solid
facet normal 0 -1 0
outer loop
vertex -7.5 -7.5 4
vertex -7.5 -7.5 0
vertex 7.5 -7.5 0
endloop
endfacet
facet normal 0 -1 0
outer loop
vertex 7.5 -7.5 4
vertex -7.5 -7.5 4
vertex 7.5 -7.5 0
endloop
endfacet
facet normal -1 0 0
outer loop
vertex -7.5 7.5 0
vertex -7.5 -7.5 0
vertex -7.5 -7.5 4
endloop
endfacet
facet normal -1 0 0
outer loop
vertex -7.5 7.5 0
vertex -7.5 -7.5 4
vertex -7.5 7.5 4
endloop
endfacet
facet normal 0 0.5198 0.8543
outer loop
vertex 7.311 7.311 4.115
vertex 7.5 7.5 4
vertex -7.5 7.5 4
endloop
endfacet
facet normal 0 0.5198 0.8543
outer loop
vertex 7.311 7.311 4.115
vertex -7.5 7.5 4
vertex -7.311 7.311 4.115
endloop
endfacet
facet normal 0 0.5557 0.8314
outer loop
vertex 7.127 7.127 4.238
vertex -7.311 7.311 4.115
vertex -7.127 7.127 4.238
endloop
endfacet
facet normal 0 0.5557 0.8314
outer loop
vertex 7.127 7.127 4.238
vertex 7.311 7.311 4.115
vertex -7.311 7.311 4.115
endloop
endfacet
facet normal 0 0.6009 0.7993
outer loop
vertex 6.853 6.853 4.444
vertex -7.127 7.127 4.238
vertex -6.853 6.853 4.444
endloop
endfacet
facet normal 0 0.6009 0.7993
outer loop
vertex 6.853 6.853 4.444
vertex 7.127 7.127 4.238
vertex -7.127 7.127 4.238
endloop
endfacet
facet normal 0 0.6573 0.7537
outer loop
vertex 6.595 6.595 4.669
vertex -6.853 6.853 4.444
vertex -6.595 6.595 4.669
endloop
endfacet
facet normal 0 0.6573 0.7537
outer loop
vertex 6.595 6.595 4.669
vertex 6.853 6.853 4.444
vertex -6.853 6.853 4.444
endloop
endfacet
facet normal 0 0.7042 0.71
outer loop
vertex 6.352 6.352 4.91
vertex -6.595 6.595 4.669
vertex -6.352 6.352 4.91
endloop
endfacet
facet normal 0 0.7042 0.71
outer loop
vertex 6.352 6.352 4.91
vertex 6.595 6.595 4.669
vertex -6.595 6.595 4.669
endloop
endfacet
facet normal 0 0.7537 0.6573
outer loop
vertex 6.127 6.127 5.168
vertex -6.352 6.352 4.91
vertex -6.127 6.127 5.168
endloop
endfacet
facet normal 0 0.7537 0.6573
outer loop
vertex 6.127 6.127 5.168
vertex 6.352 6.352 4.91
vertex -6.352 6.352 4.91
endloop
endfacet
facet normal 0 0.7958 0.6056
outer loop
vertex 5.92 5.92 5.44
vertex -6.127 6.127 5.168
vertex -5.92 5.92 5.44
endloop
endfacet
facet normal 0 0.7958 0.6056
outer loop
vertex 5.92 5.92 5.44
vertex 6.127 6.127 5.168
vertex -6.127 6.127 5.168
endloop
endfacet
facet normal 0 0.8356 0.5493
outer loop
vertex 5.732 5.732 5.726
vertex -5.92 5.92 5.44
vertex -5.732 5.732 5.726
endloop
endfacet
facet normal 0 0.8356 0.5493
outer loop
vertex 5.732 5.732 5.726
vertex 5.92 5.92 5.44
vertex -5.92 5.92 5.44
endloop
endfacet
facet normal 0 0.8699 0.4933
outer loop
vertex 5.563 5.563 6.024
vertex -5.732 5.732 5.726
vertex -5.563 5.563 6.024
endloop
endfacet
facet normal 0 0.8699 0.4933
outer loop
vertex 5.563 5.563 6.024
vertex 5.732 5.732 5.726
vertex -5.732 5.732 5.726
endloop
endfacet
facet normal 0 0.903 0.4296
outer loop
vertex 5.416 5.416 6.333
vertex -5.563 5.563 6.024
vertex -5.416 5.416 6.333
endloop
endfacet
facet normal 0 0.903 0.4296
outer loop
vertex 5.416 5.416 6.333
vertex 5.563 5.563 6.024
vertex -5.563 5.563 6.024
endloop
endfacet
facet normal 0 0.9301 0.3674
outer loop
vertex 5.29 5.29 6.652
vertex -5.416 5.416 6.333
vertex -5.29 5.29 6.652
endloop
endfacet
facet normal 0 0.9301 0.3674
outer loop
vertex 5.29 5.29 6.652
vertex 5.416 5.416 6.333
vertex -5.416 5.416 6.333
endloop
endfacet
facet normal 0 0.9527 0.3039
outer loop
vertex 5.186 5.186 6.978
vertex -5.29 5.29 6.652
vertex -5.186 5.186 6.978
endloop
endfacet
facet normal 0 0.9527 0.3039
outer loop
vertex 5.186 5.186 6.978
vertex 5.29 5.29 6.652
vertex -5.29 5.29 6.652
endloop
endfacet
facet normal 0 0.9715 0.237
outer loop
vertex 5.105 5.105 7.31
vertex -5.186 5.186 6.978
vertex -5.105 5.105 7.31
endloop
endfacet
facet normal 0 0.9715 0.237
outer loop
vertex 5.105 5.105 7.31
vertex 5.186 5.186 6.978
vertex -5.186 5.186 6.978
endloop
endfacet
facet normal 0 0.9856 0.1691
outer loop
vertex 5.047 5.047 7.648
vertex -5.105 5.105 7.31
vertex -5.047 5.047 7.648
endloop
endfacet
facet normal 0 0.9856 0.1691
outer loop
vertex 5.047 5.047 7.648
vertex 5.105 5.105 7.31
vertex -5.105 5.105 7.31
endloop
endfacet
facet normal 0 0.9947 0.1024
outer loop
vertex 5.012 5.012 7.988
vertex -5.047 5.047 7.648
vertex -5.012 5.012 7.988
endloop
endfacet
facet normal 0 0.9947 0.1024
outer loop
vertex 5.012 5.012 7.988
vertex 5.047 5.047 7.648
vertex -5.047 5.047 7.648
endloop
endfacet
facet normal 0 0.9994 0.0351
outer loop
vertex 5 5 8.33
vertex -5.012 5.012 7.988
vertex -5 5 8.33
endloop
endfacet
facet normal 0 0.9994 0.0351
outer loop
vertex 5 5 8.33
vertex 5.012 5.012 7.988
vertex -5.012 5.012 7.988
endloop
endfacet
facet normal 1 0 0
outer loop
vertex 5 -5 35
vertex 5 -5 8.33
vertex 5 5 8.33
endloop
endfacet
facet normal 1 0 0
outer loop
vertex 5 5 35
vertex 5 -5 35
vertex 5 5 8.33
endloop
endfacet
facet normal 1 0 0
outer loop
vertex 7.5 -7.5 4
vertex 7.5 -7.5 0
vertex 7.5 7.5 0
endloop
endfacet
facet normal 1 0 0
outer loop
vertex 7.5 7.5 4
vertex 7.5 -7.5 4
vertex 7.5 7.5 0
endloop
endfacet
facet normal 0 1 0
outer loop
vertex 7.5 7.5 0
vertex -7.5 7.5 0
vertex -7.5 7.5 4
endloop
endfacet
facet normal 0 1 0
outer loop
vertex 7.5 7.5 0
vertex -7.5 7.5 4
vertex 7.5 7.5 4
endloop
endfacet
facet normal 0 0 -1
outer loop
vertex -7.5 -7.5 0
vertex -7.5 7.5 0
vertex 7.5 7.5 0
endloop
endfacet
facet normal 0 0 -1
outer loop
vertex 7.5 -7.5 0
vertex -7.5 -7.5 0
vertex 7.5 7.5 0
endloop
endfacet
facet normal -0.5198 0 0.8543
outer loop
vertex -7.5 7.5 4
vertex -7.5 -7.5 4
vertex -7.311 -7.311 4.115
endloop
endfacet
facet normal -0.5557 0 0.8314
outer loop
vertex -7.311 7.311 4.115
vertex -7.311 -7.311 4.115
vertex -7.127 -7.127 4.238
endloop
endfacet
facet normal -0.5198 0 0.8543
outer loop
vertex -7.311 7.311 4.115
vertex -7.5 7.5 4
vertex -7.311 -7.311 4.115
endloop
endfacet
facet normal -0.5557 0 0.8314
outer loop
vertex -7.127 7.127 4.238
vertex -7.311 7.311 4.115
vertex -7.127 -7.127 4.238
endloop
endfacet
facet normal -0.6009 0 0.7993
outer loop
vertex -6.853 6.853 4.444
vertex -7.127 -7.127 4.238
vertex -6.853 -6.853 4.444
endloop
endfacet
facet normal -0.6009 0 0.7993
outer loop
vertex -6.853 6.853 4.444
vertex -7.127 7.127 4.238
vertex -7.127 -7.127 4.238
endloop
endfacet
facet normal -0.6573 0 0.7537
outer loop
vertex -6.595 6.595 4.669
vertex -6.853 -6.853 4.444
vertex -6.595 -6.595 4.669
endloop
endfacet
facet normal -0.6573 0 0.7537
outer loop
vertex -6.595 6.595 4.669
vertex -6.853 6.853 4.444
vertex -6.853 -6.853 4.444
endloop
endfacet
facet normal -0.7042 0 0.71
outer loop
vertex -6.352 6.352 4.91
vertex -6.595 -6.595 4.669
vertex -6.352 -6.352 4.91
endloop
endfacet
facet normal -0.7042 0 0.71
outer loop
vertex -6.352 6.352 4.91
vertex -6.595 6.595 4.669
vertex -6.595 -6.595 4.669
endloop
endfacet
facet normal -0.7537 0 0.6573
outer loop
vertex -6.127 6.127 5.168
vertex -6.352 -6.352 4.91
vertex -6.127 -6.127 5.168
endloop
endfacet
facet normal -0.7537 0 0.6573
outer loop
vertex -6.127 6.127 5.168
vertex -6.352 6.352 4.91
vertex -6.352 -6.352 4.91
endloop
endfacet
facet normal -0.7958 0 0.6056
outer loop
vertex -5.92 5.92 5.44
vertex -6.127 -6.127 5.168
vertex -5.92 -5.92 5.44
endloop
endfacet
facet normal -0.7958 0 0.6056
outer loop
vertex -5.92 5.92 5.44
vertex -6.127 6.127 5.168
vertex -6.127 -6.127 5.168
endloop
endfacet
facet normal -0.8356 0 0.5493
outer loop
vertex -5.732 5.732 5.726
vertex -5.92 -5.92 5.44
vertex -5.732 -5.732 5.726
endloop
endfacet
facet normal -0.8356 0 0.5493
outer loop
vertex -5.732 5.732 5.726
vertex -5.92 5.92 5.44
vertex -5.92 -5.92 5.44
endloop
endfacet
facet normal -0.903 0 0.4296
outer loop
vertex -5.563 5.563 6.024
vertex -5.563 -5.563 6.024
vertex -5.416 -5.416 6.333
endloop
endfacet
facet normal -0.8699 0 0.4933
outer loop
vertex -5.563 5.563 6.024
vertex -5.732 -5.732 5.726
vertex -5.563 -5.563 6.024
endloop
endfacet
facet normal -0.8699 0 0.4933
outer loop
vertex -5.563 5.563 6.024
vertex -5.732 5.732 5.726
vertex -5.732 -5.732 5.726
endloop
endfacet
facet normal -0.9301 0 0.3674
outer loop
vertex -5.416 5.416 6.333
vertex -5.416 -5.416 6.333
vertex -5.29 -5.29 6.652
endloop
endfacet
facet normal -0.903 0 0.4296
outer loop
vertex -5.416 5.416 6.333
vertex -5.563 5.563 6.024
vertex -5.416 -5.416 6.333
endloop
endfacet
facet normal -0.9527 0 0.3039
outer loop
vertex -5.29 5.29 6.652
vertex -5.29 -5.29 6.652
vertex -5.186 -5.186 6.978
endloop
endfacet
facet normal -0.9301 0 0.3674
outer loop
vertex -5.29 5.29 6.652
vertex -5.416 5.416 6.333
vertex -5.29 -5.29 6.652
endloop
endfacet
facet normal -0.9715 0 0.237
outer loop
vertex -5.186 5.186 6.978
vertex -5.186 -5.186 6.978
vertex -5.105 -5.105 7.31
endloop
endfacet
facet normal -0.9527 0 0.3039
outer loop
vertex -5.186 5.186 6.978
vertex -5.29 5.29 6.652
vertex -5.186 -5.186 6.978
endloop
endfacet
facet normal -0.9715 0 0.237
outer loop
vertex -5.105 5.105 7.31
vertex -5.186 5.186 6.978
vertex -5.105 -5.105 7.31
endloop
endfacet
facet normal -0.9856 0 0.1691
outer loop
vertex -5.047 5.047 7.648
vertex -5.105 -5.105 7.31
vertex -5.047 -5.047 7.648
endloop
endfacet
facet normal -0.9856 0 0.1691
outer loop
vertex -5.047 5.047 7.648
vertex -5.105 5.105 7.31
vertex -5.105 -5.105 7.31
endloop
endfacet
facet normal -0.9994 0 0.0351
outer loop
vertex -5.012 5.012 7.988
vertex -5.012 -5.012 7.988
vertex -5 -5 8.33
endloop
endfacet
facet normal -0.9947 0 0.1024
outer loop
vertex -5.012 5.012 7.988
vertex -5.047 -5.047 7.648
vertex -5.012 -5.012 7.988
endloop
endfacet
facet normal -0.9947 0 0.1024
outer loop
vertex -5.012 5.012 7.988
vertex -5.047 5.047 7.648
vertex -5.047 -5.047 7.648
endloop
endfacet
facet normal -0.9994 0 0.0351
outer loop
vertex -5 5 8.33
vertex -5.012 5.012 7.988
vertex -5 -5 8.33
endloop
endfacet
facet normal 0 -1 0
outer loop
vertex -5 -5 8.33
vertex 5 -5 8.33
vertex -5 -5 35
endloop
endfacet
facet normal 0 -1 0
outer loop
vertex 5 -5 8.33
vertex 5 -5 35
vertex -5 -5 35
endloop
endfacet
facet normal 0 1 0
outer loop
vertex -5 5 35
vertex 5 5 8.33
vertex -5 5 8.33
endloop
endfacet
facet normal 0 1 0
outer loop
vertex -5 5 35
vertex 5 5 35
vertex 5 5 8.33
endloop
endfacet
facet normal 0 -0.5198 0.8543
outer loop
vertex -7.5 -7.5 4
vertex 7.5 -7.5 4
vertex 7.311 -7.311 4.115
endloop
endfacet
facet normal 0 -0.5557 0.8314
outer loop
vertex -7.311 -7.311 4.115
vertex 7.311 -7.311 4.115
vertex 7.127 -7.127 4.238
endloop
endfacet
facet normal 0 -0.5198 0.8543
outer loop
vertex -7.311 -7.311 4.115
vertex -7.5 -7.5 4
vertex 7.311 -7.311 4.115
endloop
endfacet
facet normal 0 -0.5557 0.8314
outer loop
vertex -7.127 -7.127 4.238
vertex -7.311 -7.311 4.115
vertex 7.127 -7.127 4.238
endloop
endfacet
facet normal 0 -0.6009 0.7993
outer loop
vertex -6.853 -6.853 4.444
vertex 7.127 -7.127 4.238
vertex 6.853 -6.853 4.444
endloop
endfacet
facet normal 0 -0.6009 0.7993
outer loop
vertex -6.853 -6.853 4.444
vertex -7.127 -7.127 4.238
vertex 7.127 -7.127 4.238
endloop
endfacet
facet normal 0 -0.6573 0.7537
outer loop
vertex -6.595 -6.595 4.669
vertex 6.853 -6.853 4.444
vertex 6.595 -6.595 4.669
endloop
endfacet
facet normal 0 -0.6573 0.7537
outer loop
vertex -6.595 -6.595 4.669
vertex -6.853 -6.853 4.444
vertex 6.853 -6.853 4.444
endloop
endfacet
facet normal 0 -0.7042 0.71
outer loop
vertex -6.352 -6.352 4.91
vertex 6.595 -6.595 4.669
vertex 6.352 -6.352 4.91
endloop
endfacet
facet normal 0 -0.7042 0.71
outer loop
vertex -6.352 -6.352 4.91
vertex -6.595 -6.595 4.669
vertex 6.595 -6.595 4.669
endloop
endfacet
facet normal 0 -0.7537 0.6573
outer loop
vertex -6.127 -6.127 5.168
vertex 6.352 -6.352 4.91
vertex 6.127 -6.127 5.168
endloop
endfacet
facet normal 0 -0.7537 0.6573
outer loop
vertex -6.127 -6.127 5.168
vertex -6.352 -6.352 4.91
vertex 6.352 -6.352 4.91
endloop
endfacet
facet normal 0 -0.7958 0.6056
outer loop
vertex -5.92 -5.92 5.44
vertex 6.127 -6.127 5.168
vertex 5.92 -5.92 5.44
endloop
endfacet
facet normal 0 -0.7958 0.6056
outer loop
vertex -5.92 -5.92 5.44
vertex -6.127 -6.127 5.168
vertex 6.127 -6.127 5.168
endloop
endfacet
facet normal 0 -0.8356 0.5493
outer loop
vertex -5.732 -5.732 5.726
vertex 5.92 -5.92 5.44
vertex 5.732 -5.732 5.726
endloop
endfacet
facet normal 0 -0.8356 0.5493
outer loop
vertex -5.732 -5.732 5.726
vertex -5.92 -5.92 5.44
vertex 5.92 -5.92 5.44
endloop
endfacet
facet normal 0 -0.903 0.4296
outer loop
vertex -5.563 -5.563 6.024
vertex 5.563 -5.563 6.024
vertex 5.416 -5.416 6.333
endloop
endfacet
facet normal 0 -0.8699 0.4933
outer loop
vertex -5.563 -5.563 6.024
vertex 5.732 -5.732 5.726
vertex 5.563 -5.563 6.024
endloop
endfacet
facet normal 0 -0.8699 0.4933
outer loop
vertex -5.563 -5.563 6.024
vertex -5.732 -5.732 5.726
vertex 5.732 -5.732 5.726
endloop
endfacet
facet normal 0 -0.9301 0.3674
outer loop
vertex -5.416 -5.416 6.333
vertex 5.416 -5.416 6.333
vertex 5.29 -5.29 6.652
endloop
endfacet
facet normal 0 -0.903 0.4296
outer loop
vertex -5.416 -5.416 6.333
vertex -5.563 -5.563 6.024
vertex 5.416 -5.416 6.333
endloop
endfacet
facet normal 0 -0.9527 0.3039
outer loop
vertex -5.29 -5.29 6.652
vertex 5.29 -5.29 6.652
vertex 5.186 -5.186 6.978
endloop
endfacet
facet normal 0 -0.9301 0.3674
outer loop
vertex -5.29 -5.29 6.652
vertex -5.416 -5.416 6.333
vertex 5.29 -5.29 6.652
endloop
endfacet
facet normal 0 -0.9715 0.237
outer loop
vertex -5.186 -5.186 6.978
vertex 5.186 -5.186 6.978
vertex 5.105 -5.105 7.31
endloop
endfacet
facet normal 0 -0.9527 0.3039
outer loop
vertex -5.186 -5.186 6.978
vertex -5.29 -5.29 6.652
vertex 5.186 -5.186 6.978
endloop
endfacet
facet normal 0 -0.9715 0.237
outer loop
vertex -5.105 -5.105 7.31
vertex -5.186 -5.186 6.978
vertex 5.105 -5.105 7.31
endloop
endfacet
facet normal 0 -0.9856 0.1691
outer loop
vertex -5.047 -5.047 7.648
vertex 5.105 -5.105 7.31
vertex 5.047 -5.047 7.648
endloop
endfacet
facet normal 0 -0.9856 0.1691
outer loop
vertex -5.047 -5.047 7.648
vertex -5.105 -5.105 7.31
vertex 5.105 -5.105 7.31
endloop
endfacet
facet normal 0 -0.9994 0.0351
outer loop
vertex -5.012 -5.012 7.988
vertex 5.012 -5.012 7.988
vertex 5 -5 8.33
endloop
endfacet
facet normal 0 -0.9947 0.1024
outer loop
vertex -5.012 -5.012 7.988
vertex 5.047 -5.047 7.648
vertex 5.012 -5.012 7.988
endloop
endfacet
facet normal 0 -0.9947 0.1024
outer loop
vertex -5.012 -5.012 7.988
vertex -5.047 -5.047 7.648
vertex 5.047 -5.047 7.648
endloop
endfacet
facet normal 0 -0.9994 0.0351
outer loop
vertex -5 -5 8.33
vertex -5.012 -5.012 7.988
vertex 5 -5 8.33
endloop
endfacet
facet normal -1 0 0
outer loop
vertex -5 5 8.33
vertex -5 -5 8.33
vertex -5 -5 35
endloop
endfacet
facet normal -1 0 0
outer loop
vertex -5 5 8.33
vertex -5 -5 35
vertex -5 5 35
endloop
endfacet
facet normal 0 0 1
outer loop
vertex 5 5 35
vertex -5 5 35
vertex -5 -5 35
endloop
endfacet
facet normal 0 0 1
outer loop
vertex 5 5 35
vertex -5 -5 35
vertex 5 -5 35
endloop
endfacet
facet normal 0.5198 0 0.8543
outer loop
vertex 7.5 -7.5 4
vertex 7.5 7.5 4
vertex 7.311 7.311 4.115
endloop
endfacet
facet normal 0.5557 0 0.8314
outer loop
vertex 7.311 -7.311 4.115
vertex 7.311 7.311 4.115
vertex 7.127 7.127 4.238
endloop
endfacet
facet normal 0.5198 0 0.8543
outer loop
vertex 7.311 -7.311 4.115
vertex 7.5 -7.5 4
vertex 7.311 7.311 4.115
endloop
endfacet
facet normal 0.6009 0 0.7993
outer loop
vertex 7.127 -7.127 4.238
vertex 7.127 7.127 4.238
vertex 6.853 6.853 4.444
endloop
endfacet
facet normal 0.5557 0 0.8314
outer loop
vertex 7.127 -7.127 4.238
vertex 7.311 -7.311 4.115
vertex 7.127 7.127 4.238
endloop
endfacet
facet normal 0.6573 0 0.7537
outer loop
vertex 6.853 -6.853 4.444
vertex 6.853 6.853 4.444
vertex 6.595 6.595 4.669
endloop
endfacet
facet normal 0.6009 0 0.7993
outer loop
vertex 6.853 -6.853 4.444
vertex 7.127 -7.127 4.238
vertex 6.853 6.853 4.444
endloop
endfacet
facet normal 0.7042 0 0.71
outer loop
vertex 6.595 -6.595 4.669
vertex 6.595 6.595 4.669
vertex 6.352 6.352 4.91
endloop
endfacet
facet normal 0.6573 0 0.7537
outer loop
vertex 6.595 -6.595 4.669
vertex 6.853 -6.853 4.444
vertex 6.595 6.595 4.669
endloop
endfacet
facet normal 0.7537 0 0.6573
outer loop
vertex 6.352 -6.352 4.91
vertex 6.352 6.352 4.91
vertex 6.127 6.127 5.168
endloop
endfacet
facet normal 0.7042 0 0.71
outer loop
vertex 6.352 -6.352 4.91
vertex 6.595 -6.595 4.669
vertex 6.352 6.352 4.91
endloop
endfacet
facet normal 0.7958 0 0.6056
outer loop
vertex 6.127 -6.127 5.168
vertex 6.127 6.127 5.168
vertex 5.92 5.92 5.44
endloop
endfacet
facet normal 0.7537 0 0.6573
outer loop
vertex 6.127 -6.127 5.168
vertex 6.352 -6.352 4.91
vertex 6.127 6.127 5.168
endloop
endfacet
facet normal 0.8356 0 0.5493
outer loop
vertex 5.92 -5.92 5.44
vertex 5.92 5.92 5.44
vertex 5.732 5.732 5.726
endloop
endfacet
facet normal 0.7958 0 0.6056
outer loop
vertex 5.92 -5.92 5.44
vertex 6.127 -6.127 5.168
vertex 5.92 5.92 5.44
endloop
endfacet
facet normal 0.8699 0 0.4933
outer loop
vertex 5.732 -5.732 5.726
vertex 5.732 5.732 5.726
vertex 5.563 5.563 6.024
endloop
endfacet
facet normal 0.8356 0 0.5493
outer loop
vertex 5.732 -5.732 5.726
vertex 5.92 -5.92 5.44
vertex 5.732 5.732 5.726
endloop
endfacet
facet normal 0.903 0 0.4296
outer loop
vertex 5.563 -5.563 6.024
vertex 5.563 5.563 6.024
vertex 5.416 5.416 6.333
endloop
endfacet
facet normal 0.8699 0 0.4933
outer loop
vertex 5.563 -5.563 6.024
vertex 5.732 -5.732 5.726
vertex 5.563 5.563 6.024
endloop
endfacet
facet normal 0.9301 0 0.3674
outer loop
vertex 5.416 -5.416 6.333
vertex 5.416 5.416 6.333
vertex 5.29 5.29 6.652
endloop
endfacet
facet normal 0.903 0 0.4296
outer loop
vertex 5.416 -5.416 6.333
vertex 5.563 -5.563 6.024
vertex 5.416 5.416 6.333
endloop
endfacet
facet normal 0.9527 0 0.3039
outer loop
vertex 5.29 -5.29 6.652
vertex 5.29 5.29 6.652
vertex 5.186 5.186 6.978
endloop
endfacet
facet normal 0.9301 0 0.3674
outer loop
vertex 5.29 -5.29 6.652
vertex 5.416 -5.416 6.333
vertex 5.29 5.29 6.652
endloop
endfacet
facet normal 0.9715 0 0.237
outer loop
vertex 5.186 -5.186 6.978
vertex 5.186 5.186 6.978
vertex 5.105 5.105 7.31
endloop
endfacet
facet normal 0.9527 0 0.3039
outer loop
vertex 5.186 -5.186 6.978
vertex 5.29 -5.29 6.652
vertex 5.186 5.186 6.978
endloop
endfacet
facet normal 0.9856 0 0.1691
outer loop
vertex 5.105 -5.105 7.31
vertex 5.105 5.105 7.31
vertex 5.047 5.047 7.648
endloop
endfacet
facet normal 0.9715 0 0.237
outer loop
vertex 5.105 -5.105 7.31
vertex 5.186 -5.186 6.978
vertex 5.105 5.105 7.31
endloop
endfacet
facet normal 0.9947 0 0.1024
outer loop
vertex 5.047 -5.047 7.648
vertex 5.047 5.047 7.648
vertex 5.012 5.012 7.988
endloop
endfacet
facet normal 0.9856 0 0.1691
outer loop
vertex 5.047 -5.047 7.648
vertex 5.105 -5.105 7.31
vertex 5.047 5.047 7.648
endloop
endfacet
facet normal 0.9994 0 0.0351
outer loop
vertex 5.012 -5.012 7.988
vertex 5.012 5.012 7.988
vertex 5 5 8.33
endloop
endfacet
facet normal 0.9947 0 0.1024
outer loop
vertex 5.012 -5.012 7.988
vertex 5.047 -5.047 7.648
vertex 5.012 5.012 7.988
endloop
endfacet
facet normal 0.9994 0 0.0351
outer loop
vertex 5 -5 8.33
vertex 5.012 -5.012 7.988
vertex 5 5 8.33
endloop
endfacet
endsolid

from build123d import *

# Parameters (mm, degrees)
F0_W         = 10
F0_H         = 10
F1_DEPTH     = 35
F2_W         = 15
F2_H         = 15
F3_DEPTH     = 4
F4_T1_DEPTH  = 10
F4_T3_DEPTH  = 10
F4_T9_DEPTH  = 20.8253175473
F4_T14_DEPTH = 20.8253175473
F4_T22_DEPTH = 20.8253175473
F4_T27_DEPTH = 20.8253175473
F4_T35_DEPTH = 20.8253175473
F4_T40_DEPTH = 20.8253175473
F4_T48_DEPTH = 20.8253175473
F4_T53_DEPTH = 20.8253175473


# Not quite as in the source:
# - a fillet or chamfer that OpenCascade refuses, or shapes differently, is made with other operations: its cross-section is extruded or revolved along the edge and cut away or added


with BuildPart() as f1:
    # F0 (on Top) → F1 (new body)
    with BuildSketch(Plane.XY):
        Rectangle(F0_W, F0_H)
    extrude(amount=F1_DEPTH)

    # F2 (on Top) → F3 (join)
    with BuildSketch(Plane.XY):
        Rectangle(F2_W, F2_H)
    extrude(amount=F3_DEPTH)

    # F4: fillet of radius 5 on 4 edges, made by hand

    # F4_s2 → F4_t1 (join)
    with BuildSketch(Plane.XZ.offset(-5)):
        with BuildLine():
            ThreePointArc((-7.5, 4), (-5.6698729811, 5.8301270189), (-5, 8.3301270189))
            Line((-5, 8.3301270189), (-5, 4))
            Line((-5, 4), (-7.5, 4))
        make_face()
        with BuildLine():
            ThreePointArc((7.5, 4), (5.6698729811, 5.8301270189), (5, 8.3301270189))
            Line((5, 8.3301270189), (5, 4))
            Line((5, 4), (7.5, 4))
        make_face()
    extrude(amount=F4_T1_DEPTH)

    # F4_s4 → F4_t3 (join)
    with BuildSketch(Plane.YZ.offset(-5)):
        with BuildLine():
            ThreePointArc((7.5, 4), (5.6698729811, 5.8301270189), (5, 8.3301270189))
            Line((5, 8.3301270189), (5, 4))
            Line((5, 4), (7.5, 4))
        make_face()
        with BuildLine():
            ThreePointArc((-7.5, 4), (-5.6698729811, 5.8301270189), (-5, 8.3301270189))
            Line((-5, 8.3301270189), (-5, 4))
            Line((-5, 4), (-7.5, 4))
        make_face()
    extrude(amount=F4_T3_DEPTH)


with BuildPart() as f4_tool7:
    # F4_s8 → F4_t9 (new body)
    with BuildSketch(Plane.YZ.offset(5)):
        with BuildLine():
            ThreePointArc((7.5, 4), (5.6698729811, 5.8301270189), (5, 8.3301270189))
            Line((5, 8.3301270189), (5, 4))
            Line((5, 4), (7.5, 4))
        make_face()
    extrude(amount=-F4_T9_DEPTH)

    split(bisect_by=Plane.YZ.offset(-7.5), keep=Keep.TOP)

    split(bisect_by=Plane.YZ.offset(-5), keep=Keep.BOTTOM)


with BuildPart() as f4_tool12:
    # F4_s13 → F4_t14 (new body)
    with BuildSketch(Plane.XZ.offset(-15.8253175473)):
        with BuildLine():
            ThreePointArc((-7.5, 4), (-5.6698729811, 5.8301270189), (-5, 8.3301270189))
            Line((-5, 8.3301270189), (-5, 4))
            Line((-5, 4), (-7.5, 4))
        make_face()
    extrude(amount=F4_T14_DEPTH)

    split(bisect_by=Plane.XZ.offset(-7.5), keep=Keep.TOP)

    split(bisect_by=Plane.XZ.offset(-5), keep=Keep.BOTTOM)


with BuildPart() as f4_tool7_1:
    add(f4_tool7.part)

    # F4_t17: intersect F4_tool12
    add(f4_tool12.part, mode=Mode.INTERSECT)


with BuildPart() as f1_1:
    add(f1.part)

    # F4_t5: union F4_tool7
    add(f4_tool7_1.part)


with BuildPart() as f4_tool20:
    # F4_s21 → F4_t22 (new body)
    with BuildSketch(Plane.XZ.offset(-5)):
        with BuildLine():
            ThreePointArc((-7.5, 4), (-5.6698729811, 5.8301270189), (-5, 8.3301270189))
            Line((-5, 8.3301270189), (-5, 4))
            Line((-5, 4), (-7.5, 4))
        make_face()
    extrude(amount=F4_T22_DEPTH)

    split(bisect_by=Plane.XZ.offset(7.5), keep=Keep.BOTTOM)

    split(bisect_by=Plane.XZ.offset(5), keep=Keep.TOP)


with BuildPart() as f4_tool25:
    # F4_s26 → F4_t27 (new body)
    with BuildSketch(Plane.YZ.offset(-15.8253175473)):
        with BuildLine():
            ThreePointArc((-7.5, 4), (-5.6698729811, 5.8301270189), (-5, 8.3301270189))
            Line((-5, 8.3301270189), (-5, 4))
            Line((-5, 4), (-7.5, 4))
        make_face()
    extrude(amount=F4_T27_DEPTH)

    split(bisect_by=Plane.YZ.offset(-7.5), keep=Keep.TOP)

    split(bisect_by=Plane.YZ.offset(-5), keep=Keep.BOTTOM)


with BuildPart() as f4_tool20_1:
    add(f4_tool20.part)

    # F4_t30: intersect F4_tool25
    add(f4_tool25.part, mode=Mode.INTERSECT)


with BuildPart() as f1_2:
    add(f1_1.part)

    # F4_t18: union F4_tool20
    add(f4_tool20_1.part)


with BuildPart() as f4_tool33:
    # F4_s34 → F4_t35 (new body)
    with BuildSketch(Plane.YZ.offset(15.8253175473)):
        with BuildLine():
            ThreePointArc((7.5, 4), (5.6698729811, 5.8301270189), (5, 8.3301270189))
            Line((5, 8.3301270189), (5, 4))
            Line((5, 4), (7.5, 4))
        make_face()
    extrude(amount=-F4_T35_DEPTH)

    split(bisect_by=Plane.YZ.offset(7.5), keep=Keep.BOTTOM)

    split(bisect_by=Plane.YZ.offset(5), keep=Keep.TOP)


with BuildPart() as f4_tool38:
    # F4_s39 → F4_t40 (new body)
    with BuildSketch(Plane.XZ.offset(5)):
        with BuildLine():
            ThreePointArc((7.5, 4), (5.6698729811, 5.8301270189), (5, 8.3301270189))
            Line((5, 8.3301270189), (5, 4))
            Line((5, 4), (7.5, 4))
        make_face()
    extrude(amount=-F4_T40_DEPTH)

    split(bisect_by=Plane.XZ.offset(-7.5), keep=Keep.TOP)

    split(bisect_by=Plane.XZ.offset(-5), keep=Keep.BOTTOM)


with BuildPart() as f4_tool33_1:
    add(f4_tool33.part)

    # F4_t43: intersect F4_tool38
    add(f4_tool38.part, mode=Mode.INTERSECT)


with BuildPart() as f1_3:
    add(f1_2.part)

    # F4_t31: union F4_tool33
    add(f4_tool33_1.part)


with BuildPart() as f4_tool46:
    # F4_s47 → F4_t48 (new body)
    with BuildSketch(Plane.YZ.offset(-5)):
        with BuildLine():
            ThreePointArc((-7.5, 4), (-5.6698729811, 5.8301270189), (-5, 8.3301270189))
            Line((-5, 8.3301270189), (-5, 4))
            Line((-5, 4), (-7.5, 4))
        make_face()
    extrude(amount=F4_T48_DEPTH)

    split(bisect_by=Plane.YZ.offset(7.5), keep=Keep.BOTTOM)

    split(bisect_by=Plane.YZ.offset(5), keep=Keep.TOP)


with BuildPart() as f4_tool51:
    # F4_s52 → F4_t53 (new body)
    with BuildSketch(Plane.XZ.offset(15.8253175473)):
        with BuildLine():
            ThreePointArc((7.5, 4), (5.6698729811, 5.8301270189), (5, 8.3301270189))
            Line((5, 8.3301270189), (5, 4))
            Line((5, 4), (7.5, 4))
        make_face()
    extrude(amount=-F4_T53_DEPTH)

    split(bisect_by=Plane.XZ.offset(7.5), keep=Keep.BOTTOM)

    split(bisect_by=Plane.XZ.offset(5), keep=Keep.TOP)


with BuildPart() as f4_tool46_1:
    add(f4_tool46.part)

    # F4_t56: intersect F4_tool51
    add(f4_tool51.part, mode=Mode.INTERSECT)


with BuildPart() as f1_4:
    add(f1_3.part)

    # F4_t44: union F4_tool46
    add(f4_tool46_1.part)


solid = f1_4.part
